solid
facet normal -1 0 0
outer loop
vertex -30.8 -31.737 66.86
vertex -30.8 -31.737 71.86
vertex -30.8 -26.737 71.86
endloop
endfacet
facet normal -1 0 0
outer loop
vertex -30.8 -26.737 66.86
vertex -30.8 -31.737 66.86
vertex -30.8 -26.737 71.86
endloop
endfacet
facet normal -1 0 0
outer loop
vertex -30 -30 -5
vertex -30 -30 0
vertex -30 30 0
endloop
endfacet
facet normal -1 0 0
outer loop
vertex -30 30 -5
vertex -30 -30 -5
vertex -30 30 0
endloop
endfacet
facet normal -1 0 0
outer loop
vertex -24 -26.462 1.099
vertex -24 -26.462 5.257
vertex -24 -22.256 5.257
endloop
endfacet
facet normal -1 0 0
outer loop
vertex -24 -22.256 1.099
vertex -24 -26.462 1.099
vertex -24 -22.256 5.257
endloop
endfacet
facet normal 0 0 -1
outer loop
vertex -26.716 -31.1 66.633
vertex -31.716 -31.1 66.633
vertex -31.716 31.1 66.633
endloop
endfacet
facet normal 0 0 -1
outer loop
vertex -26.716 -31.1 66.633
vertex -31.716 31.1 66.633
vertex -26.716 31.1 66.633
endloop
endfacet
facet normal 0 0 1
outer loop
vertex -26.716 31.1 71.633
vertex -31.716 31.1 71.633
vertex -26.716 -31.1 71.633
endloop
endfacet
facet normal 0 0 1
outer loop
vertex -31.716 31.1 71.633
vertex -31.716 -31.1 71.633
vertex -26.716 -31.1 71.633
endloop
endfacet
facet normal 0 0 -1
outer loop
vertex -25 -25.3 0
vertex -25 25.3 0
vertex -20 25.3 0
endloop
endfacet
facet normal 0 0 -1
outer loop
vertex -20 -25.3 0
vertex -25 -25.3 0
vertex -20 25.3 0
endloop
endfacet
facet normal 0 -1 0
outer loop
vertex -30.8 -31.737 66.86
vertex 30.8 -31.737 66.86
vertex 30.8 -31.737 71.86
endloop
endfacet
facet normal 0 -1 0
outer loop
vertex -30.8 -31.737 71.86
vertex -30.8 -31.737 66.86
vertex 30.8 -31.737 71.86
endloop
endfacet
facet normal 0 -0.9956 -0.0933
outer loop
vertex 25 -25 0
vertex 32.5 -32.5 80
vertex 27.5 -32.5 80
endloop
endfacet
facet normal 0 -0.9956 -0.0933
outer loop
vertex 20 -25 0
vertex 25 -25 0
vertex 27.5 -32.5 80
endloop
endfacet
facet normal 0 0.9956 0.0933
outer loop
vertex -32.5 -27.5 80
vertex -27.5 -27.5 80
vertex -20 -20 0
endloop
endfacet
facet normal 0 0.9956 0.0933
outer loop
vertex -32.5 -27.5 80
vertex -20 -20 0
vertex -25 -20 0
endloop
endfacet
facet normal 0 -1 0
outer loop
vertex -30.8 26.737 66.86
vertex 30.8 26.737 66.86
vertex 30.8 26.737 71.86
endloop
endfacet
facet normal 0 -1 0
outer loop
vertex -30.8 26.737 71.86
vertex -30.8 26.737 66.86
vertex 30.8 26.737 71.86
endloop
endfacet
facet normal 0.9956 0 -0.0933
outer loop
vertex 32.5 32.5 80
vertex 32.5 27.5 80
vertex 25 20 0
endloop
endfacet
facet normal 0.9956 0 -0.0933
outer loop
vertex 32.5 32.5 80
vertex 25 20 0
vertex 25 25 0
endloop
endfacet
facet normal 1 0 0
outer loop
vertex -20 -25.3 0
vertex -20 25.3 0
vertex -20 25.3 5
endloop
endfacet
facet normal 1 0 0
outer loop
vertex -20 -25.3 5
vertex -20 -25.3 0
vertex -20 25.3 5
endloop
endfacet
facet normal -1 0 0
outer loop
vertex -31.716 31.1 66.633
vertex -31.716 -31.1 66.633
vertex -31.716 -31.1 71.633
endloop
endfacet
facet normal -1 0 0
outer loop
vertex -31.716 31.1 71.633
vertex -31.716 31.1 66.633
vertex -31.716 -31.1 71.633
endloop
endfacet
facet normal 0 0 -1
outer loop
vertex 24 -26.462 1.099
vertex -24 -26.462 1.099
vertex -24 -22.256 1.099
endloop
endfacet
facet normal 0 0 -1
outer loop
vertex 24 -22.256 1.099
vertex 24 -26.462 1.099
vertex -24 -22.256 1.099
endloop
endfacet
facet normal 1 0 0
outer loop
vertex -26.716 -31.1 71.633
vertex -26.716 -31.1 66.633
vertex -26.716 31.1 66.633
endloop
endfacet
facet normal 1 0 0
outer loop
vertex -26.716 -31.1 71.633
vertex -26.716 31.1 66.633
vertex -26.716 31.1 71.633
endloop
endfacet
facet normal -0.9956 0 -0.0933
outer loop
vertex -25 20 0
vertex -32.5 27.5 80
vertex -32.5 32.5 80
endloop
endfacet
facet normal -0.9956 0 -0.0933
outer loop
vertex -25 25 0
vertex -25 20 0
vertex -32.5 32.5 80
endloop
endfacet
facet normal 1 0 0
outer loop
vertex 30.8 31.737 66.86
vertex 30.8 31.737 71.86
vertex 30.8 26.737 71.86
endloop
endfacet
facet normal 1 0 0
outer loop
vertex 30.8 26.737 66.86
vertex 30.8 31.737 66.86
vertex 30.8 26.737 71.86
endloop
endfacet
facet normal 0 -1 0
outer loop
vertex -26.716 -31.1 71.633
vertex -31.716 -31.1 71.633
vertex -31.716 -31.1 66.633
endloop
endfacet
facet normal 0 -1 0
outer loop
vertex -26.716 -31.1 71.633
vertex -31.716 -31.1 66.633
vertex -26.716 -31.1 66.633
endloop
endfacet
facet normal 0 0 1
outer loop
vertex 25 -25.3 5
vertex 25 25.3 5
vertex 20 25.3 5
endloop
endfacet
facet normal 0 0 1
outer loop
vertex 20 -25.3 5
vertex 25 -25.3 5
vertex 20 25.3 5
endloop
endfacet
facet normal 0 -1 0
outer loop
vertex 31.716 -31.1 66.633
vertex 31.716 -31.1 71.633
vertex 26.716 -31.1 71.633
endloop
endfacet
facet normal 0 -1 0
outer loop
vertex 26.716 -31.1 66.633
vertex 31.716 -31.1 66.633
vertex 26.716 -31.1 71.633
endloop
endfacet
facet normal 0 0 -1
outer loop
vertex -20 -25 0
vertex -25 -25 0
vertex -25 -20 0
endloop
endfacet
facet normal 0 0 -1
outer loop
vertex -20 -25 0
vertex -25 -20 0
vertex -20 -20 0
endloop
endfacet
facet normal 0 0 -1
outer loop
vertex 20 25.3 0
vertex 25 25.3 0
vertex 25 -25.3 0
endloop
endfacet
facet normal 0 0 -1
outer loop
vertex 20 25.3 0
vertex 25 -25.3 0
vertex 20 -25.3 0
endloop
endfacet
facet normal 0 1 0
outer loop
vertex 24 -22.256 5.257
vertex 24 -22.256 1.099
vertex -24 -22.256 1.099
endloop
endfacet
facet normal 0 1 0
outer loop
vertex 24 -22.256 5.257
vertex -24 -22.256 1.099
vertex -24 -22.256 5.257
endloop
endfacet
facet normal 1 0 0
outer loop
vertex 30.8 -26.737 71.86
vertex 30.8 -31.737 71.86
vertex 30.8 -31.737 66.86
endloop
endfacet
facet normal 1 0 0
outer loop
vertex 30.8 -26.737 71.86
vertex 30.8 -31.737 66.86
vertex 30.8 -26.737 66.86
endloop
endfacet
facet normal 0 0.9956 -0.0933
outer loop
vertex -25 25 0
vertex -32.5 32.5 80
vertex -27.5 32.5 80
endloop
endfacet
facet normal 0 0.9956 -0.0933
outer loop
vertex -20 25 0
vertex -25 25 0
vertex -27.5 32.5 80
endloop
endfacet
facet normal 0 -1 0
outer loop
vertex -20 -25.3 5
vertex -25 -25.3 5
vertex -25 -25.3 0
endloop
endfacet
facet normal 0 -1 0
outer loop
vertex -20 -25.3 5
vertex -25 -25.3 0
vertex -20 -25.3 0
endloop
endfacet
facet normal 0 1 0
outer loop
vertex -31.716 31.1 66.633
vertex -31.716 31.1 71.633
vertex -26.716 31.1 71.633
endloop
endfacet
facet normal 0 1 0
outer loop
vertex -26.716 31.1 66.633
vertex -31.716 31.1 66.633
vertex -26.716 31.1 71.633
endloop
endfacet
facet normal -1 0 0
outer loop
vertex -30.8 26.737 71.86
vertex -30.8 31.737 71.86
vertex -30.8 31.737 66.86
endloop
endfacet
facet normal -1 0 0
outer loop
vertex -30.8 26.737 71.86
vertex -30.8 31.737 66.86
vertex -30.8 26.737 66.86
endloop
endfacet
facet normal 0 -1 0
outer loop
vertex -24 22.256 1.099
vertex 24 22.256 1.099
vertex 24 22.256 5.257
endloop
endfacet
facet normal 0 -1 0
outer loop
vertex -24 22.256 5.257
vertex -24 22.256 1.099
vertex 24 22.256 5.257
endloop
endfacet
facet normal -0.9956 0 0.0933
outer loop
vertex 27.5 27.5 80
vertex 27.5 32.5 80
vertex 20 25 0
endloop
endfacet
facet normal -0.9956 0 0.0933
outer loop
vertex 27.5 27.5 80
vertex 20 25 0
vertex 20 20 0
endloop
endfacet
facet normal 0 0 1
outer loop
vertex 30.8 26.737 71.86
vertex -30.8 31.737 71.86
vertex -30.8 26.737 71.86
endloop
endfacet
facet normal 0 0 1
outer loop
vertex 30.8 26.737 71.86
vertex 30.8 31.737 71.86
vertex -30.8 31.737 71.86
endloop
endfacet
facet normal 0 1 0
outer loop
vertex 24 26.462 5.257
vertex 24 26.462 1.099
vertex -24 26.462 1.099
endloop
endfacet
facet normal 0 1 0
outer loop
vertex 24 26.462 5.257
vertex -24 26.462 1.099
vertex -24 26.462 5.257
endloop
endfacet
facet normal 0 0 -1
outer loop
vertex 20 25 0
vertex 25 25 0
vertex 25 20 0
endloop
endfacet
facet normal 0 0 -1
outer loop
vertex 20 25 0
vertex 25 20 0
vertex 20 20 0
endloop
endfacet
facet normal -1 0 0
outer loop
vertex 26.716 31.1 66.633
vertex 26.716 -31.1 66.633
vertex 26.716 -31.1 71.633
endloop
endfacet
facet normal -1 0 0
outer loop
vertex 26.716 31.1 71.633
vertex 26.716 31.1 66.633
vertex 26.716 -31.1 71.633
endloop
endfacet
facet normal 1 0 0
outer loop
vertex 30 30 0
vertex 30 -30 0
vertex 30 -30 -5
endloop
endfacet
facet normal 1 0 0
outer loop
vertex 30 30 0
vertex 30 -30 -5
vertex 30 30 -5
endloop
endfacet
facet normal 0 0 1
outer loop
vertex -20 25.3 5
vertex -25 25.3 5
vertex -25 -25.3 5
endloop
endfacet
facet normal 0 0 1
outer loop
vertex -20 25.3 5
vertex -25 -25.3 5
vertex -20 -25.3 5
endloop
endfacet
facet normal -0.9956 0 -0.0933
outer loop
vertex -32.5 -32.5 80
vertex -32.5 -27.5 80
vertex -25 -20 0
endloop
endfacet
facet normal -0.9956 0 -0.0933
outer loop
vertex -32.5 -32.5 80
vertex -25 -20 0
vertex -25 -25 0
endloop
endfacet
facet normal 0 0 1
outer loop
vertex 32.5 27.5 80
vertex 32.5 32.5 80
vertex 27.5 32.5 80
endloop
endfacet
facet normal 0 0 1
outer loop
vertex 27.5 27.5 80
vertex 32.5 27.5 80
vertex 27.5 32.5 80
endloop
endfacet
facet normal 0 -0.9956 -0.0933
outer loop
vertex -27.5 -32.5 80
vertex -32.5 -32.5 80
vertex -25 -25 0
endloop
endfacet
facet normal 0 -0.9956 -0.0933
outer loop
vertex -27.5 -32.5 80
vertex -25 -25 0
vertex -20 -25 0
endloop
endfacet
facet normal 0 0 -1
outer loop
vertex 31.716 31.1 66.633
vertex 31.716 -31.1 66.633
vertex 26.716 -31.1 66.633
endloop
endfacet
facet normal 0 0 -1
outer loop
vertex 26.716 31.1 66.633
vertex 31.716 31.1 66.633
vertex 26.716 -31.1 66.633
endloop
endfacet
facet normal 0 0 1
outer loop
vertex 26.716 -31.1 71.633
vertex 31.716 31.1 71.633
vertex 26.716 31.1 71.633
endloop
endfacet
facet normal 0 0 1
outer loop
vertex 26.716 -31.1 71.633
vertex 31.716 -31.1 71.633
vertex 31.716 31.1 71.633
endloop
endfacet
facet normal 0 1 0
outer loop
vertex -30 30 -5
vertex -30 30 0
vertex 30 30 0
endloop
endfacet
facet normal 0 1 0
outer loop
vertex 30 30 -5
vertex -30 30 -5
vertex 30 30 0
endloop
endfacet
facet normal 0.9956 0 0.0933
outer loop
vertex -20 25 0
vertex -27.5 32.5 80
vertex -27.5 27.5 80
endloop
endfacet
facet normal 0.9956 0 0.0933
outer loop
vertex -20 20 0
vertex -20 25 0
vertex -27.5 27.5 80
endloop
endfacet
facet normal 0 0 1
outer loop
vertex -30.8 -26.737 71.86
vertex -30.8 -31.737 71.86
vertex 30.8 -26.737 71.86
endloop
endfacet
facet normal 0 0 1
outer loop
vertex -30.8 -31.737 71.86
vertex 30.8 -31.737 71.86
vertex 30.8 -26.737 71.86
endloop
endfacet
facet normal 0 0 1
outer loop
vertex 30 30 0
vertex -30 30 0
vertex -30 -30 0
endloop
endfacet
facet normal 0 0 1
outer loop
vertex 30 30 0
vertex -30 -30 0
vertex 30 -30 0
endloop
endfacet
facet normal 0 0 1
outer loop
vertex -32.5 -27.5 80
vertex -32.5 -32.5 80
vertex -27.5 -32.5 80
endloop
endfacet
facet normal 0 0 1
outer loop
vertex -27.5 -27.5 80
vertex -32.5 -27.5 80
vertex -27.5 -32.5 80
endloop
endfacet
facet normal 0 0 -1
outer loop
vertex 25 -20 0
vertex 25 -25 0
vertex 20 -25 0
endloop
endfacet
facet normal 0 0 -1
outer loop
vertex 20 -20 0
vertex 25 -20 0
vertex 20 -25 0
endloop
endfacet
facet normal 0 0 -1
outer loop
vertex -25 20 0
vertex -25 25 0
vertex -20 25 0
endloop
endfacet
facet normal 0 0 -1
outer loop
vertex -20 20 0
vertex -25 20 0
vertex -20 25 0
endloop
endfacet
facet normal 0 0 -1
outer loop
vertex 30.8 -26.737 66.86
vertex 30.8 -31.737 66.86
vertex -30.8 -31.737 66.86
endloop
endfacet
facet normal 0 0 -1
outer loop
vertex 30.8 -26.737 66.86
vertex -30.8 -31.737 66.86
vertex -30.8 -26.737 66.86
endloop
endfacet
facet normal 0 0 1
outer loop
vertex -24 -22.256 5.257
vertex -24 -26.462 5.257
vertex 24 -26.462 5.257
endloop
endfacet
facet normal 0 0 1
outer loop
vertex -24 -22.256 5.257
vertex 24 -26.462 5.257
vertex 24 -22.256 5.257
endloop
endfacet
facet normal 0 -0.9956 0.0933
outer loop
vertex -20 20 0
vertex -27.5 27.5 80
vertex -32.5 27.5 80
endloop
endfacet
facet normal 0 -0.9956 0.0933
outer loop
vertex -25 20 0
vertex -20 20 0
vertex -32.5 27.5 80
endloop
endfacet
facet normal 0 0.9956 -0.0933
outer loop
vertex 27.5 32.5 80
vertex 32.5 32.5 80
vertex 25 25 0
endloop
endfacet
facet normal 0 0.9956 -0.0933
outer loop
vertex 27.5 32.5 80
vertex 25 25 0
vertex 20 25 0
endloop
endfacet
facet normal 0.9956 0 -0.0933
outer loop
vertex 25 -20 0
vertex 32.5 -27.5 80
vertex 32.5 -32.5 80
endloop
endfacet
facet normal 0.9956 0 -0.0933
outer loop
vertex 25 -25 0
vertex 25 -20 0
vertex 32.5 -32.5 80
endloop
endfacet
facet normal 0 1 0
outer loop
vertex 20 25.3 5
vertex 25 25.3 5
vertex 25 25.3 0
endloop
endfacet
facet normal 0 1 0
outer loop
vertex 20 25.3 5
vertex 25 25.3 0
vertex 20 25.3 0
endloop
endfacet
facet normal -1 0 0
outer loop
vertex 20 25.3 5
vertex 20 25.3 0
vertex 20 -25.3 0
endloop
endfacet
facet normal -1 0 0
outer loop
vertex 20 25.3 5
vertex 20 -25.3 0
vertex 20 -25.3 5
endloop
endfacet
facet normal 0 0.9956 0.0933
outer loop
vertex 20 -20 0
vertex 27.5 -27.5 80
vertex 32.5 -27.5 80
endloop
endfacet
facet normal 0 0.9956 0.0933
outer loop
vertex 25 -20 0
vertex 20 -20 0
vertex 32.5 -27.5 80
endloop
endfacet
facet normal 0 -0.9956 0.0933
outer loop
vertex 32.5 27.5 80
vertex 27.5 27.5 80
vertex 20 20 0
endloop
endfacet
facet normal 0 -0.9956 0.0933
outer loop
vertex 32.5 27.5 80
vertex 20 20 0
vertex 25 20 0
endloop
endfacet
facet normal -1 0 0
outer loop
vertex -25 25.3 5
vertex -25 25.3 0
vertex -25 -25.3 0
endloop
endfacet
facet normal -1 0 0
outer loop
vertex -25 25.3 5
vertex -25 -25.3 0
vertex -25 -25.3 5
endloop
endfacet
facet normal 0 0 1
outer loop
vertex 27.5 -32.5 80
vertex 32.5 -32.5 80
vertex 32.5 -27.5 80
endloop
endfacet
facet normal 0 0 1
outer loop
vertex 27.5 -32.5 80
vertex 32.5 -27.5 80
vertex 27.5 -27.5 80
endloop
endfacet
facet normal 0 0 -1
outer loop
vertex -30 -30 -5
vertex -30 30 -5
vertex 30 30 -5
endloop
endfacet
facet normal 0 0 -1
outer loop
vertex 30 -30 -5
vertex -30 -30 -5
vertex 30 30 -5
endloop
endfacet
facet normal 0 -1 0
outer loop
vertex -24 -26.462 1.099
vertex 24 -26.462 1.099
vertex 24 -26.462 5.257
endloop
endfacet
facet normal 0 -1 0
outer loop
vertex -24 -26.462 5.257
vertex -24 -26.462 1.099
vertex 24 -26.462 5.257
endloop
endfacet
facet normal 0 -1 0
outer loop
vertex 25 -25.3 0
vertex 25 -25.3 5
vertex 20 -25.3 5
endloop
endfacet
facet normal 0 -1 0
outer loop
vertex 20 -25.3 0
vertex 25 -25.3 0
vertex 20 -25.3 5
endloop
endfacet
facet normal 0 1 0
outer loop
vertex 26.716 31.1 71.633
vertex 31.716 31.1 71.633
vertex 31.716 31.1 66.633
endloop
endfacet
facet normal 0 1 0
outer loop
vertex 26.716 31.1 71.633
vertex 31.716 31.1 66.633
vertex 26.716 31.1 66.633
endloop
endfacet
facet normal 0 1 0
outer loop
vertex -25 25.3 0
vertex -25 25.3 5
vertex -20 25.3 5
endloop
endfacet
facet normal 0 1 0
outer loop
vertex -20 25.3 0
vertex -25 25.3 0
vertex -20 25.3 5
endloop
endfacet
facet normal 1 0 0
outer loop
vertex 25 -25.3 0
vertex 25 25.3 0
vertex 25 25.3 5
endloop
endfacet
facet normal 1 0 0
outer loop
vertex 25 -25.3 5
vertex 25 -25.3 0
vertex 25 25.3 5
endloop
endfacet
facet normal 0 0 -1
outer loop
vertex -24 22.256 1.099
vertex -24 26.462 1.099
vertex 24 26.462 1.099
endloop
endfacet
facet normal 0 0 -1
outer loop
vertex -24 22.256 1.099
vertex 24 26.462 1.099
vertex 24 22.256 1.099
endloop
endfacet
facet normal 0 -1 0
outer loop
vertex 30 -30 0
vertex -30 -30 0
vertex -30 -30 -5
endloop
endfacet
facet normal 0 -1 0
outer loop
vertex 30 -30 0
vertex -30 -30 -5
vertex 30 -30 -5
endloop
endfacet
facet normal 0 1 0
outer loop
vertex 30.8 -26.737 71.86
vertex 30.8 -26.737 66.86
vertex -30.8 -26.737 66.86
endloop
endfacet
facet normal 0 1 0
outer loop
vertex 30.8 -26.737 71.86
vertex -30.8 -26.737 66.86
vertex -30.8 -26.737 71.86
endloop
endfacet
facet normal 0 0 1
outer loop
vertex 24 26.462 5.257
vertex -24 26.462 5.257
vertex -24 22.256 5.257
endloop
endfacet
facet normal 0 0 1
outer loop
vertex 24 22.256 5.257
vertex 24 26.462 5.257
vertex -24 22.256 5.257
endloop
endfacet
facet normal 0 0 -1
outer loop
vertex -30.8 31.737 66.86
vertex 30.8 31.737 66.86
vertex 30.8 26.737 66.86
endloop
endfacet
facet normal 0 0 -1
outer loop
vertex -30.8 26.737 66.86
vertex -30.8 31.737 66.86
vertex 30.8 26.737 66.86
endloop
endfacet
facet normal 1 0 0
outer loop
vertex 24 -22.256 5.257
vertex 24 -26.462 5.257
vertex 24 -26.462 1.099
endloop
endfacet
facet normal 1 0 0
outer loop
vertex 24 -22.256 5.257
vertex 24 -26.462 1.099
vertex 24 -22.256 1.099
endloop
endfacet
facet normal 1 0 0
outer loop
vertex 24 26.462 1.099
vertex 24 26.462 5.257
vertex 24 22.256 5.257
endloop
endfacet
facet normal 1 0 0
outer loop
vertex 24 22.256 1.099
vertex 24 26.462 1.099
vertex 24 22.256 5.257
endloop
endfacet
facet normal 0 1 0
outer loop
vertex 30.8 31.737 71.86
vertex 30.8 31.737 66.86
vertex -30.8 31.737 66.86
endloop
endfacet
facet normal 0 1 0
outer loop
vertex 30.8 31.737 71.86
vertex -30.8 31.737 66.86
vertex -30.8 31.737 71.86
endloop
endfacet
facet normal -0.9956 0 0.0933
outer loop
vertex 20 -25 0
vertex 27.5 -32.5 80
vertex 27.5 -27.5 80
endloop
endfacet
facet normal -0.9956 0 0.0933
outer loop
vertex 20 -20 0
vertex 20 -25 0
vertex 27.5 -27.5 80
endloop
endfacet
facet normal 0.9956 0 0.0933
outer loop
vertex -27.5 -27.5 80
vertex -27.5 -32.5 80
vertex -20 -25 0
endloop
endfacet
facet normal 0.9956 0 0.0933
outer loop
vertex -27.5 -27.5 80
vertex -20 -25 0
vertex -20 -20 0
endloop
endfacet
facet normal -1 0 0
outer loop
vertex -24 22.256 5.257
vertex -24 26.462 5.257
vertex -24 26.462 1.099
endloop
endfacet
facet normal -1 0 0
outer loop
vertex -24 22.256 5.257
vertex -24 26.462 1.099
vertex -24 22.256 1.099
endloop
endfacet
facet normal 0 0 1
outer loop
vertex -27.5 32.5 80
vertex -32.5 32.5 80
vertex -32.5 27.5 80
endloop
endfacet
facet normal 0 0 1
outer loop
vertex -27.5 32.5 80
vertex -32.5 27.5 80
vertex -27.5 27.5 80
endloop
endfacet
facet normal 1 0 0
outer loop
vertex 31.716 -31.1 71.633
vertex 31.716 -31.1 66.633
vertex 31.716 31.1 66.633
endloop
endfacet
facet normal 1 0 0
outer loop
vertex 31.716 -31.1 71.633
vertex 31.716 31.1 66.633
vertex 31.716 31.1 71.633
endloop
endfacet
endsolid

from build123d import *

# Parameters (mm, degrees)
F0_W      = 60
F0_H      = 60
F0_W_2    = 5
F0_H_2    = 5
F3_DEPTH  = 5
F2_W      = 5
F2_H      = 5
F7_W      = 5
F7_H      = 5
F8_DEPTH  = 25.3
F10_W     = 5
F10_H     = 5
F11_DEPTH = 30.8
F10_W_2   = 4.2065531015
F10_H_2   = 4.157690797
F13_DEPTH = 24
F15_W     = 5
F15_H     = 5
F16_DEPTH = 31.1


with BuildPart() as f3:
    # F0 (on Top) → F3 (new body)
    with BuildSketch(Plane.XY):
        Rectangle(F0_W, F0_H)
        with Locations((-22.5, -22.5)):
            Rectangle(F0_W_2, F0_H_2, mode=Mode.SUBTRACT)
        with Locations((22.5, -22.5)):
            Rectangle(F0_W_2, F0_H_2, mode=Mode.SUBTRACT)
        with Locations((-22.5, 22.5)):
            Rectangle(F0_W_2, F0_H_2, mode=Mode.SUBTRACT)
        with Locations((22.5, 22.5)):
            Rectangle(F0_W_2, F0_H_2, mode=Mode.SUBTRACT)
        with Locations((22.5, 22.5)):
            Rectangle(F0_W_2, F0_H_2)
        with Locations((22.5, -22.5)):
            Rectangle(F0_W_2, F0_H_2)
        with Locations((-22.5, -22.5)):
            Rectangle(F0_W_2, F0_H_2)
        with Locations((-22.5, 22.5)):
            Rectangle(F0_W_2, F0_H_2)
    extrude(amount=-F3_DEPTH)


with BuildPart() as f4:
    # F2 (on offset) → F4 section 0
    with BuildSketch(Plane.XY.offset(80)):
        with Locations((-30, -30)):
            Rectangle(F2_W, F2_H)
    # F0 (on Top) → F4 section 1
    with BuildSketch(Plane.XY):
        with Locations((-22.5, -22.5)):
            Rectangle(F0_W_2, F0_H_2)
    loft()


with BuildPart() as f5_1:
    # F5: instance of F4
    add(f4.part.mirror(Plane.XZ))


with BuildPart() as f6_1:
    # F6: instance of F5_1
    add(f5_1.part.mirror(Plane.YZ))


with BuildPart() as f6_2:
    # F6: instance of F4
    add(f4.part.mirror(Plane.YZ))


with BuildPart() as f8:
    # F7 (on Front) → F8 (new body, symmetric)
    with BuildSketch(Plane.XZ):
        with Locations((-22.5, 2.5)):
            Rectangle(F7_W, F7_H)
    extrude(amount=F8_DEPTH, both=True)


with BuildPart() as f9_1:
    # F9: instance of F8
    add(f8.part.mirror(Plane.YZ))


with BuildPart() as f11:
    # F10 (on Right) → F11 (new body, symmetric)
    with BuildSketch(Plane.YZ):
        with Locations((-29.2368422557, 69.3596507278)):
            Rectangle(F10_W, F10_H)
    extrude(amount=F11_DEPTH, both=True)


with BuildPart() as f12_1:
    # F12: instance of F11
    add(f11.part.mirror(Plane.XZ))


with BuildPart() as f13:
    # F10 (on Right) → F13 (new body, symmetric)
    with BuildSketch(Plane.YZ):
        with Locations((-24.3592057377, 3.1782335136)):
            Rectangle(F10_W_2, F10_H_2)
    extrude(amount=F13_DEPTH, both=True)


with BuildPart() as f14_1:
    # F14: instance of F13
    add(f13.part.mirror(Plane.XZ))


with BuildPart() as f16:
    # F15 (on Front) → F16 (new body, symmetric)
    with BuildSketch(Plane.XZ):
        with Locations((-29.2155756838, 69.1328072941)):
            Rectangle(F15_W, F15_H)
    extrude(amount=F16_DEPTH, both=True)


with BuildPart() as f17_1:
    # F17: instance of F16
    add(f16.part.mirror(Plane.YZ))


solid = Compound([f3.part, f4.part, f5_1.part, f6_1.part, f6_2.part, f8.part, f9_1.part, f11.part, f12_1.part, f13.part, f14_1.part, f16.part, f17_1.part])
